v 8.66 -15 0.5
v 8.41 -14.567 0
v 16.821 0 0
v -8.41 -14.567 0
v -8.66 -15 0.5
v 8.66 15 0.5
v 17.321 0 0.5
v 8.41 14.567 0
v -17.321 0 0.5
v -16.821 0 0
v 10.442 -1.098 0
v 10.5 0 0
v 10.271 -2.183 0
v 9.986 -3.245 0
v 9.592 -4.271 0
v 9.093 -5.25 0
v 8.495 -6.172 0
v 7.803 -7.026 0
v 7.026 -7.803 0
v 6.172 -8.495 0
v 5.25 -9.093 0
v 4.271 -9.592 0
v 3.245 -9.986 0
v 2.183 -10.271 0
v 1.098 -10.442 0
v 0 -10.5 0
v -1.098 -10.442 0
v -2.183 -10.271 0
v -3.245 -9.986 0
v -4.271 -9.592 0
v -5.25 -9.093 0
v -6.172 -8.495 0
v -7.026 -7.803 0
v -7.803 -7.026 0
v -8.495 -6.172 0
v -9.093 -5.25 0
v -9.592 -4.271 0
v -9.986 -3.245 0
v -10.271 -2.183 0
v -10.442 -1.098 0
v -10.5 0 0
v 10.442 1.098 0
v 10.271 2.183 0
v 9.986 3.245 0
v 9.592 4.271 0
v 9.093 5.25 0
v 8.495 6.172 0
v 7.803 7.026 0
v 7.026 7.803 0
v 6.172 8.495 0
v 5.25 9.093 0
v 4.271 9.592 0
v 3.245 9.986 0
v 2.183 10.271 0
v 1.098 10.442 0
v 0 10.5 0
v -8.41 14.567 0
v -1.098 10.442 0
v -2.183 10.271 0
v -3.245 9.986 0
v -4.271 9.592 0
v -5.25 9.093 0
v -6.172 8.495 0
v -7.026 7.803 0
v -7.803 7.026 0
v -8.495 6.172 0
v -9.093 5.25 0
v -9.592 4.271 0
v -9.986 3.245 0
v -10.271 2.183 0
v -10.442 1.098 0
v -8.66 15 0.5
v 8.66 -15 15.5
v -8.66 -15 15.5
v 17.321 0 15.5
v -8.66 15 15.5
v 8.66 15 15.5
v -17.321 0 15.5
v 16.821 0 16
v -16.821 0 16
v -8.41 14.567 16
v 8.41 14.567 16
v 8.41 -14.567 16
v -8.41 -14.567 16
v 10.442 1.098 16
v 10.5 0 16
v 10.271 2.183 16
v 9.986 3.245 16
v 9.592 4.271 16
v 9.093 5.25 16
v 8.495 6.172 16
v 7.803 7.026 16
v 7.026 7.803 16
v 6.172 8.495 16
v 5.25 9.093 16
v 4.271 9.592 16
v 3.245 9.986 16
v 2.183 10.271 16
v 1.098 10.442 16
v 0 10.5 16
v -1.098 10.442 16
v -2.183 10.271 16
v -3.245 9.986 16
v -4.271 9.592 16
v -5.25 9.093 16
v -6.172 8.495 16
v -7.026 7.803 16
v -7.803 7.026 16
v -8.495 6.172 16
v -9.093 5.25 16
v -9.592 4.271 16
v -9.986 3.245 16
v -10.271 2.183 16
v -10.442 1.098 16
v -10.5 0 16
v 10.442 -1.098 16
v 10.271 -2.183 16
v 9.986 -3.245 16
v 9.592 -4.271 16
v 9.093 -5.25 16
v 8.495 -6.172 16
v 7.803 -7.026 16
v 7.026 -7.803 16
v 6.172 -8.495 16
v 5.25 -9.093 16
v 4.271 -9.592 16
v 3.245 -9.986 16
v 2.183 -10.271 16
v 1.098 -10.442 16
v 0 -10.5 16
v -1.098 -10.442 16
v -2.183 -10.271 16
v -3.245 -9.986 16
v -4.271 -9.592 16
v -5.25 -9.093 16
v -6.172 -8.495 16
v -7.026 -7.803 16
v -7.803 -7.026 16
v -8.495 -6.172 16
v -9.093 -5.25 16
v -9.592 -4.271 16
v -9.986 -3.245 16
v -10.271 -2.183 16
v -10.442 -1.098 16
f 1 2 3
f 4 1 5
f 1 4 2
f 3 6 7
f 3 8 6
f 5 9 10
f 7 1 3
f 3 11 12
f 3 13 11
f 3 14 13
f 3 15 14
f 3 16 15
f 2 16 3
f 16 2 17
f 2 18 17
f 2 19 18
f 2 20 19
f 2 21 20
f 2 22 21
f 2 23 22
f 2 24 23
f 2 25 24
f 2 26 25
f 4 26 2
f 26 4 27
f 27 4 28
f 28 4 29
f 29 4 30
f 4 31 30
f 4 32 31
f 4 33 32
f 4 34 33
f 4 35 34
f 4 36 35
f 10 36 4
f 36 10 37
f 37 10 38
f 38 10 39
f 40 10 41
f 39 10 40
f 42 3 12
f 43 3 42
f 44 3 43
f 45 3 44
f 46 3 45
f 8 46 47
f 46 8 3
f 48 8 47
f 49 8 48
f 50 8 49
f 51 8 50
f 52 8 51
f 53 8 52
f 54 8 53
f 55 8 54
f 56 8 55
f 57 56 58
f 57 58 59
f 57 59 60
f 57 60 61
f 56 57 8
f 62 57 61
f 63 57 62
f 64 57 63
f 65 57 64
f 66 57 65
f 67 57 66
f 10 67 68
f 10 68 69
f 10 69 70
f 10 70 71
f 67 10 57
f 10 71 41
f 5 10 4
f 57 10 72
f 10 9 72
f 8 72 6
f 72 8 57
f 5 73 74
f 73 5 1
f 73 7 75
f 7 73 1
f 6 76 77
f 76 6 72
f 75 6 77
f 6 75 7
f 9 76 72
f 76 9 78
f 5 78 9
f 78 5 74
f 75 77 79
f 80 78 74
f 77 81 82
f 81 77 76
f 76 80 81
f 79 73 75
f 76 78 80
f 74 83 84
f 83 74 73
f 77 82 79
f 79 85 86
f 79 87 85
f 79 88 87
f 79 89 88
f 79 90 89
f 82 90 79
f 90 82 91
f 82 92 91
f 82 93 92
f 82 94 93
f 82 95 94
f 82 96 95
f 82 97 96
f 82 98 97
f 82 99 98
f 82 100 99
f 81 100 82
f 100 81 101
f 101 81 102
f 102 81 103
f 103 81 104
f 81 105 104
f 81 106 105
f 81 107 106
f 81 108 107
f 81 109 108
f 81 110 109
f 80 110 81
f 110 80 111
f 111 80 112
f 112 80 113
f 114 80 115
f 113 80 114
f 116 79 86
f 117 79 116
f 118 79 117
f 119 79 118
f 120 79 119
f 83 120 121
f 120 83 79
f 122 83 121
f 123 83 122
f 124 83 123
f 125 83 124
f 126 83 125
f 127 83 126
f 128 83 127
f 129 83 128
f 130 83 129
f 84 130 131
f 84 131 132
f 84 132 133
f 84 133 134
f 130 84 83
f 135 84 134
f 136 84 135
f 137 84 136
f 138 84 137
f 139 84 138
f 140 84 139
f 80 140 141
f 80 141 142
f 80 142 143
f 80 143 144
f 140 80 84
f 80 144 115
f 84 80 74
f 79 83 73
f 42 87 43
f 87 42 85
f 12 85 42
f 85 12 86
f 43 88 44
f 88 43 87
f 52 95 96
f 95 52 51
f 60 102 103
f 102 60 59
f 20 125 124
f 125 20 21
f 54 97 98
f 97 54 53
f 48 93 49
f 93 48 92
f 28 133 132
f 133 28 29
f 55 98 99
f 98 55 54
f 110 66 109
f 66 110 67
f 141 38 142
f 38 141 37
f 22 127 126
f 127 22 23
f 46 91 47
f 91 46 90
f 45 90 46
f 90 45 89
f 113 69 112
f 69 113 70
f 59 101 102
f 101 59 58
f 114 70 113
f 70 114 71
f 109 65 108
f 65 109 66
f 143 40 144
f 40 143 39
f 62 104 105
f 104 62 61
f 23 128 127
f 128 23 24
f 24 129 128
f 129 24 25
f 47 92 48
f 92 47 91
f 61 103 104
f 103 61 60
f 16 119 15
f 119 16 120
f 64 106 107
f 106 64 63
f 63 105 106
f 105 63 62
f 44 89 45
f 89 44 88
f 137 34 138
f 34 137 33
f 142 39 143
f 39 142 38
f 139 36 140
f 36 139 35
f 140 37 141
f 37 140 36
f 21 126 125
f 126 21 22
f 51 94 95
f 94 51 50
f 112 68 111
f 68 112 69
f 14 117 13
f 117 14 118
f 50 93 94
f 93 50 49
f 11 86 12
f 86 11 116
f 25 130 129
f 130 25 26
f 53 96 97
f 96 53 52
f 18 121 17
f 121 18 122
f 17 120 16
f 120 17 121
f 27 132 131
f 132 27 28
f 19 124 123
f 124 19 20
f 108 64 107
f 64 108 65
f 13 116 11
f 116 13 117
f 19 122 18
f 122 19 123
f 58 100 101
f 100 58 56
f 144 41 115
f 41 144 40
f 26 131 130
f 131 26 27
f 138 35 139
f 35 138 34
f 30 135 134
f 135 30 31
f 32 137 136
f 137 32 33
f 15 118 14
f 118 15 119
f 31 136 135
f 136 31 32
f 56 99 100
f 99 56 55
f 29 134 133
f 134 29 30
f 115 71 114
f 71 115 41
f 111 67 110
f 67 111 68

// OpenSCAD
// Through hex nut.
$fn = 60;
eps = 0.02;
thread_clearance_d = 21;
flat = 30;
thickness = 16;
chamfer = 0.5;
difference() {
    union() {
        cylinder(d1 = flat / cos(30) - 2 * chamfer, d2 = flat / cos(30), h = chamfer, $fn = 6);
        translate([0, 0, chamfer]) cylinder(d = flat / cos(30), h = thickness - 2 * chamfer, $fn = 6);
        translate([0, 0, thickness - chamfer]) cylinder(d1 = flat / cos(30), d2 = flat / cos(30) - 2 * chamfer, h = chamfer, $fn = 6);
    }
    translate([0, 0, -eps]) cylinder(d = thread_clearance_d, h = thickness + 2 * eps);
}
